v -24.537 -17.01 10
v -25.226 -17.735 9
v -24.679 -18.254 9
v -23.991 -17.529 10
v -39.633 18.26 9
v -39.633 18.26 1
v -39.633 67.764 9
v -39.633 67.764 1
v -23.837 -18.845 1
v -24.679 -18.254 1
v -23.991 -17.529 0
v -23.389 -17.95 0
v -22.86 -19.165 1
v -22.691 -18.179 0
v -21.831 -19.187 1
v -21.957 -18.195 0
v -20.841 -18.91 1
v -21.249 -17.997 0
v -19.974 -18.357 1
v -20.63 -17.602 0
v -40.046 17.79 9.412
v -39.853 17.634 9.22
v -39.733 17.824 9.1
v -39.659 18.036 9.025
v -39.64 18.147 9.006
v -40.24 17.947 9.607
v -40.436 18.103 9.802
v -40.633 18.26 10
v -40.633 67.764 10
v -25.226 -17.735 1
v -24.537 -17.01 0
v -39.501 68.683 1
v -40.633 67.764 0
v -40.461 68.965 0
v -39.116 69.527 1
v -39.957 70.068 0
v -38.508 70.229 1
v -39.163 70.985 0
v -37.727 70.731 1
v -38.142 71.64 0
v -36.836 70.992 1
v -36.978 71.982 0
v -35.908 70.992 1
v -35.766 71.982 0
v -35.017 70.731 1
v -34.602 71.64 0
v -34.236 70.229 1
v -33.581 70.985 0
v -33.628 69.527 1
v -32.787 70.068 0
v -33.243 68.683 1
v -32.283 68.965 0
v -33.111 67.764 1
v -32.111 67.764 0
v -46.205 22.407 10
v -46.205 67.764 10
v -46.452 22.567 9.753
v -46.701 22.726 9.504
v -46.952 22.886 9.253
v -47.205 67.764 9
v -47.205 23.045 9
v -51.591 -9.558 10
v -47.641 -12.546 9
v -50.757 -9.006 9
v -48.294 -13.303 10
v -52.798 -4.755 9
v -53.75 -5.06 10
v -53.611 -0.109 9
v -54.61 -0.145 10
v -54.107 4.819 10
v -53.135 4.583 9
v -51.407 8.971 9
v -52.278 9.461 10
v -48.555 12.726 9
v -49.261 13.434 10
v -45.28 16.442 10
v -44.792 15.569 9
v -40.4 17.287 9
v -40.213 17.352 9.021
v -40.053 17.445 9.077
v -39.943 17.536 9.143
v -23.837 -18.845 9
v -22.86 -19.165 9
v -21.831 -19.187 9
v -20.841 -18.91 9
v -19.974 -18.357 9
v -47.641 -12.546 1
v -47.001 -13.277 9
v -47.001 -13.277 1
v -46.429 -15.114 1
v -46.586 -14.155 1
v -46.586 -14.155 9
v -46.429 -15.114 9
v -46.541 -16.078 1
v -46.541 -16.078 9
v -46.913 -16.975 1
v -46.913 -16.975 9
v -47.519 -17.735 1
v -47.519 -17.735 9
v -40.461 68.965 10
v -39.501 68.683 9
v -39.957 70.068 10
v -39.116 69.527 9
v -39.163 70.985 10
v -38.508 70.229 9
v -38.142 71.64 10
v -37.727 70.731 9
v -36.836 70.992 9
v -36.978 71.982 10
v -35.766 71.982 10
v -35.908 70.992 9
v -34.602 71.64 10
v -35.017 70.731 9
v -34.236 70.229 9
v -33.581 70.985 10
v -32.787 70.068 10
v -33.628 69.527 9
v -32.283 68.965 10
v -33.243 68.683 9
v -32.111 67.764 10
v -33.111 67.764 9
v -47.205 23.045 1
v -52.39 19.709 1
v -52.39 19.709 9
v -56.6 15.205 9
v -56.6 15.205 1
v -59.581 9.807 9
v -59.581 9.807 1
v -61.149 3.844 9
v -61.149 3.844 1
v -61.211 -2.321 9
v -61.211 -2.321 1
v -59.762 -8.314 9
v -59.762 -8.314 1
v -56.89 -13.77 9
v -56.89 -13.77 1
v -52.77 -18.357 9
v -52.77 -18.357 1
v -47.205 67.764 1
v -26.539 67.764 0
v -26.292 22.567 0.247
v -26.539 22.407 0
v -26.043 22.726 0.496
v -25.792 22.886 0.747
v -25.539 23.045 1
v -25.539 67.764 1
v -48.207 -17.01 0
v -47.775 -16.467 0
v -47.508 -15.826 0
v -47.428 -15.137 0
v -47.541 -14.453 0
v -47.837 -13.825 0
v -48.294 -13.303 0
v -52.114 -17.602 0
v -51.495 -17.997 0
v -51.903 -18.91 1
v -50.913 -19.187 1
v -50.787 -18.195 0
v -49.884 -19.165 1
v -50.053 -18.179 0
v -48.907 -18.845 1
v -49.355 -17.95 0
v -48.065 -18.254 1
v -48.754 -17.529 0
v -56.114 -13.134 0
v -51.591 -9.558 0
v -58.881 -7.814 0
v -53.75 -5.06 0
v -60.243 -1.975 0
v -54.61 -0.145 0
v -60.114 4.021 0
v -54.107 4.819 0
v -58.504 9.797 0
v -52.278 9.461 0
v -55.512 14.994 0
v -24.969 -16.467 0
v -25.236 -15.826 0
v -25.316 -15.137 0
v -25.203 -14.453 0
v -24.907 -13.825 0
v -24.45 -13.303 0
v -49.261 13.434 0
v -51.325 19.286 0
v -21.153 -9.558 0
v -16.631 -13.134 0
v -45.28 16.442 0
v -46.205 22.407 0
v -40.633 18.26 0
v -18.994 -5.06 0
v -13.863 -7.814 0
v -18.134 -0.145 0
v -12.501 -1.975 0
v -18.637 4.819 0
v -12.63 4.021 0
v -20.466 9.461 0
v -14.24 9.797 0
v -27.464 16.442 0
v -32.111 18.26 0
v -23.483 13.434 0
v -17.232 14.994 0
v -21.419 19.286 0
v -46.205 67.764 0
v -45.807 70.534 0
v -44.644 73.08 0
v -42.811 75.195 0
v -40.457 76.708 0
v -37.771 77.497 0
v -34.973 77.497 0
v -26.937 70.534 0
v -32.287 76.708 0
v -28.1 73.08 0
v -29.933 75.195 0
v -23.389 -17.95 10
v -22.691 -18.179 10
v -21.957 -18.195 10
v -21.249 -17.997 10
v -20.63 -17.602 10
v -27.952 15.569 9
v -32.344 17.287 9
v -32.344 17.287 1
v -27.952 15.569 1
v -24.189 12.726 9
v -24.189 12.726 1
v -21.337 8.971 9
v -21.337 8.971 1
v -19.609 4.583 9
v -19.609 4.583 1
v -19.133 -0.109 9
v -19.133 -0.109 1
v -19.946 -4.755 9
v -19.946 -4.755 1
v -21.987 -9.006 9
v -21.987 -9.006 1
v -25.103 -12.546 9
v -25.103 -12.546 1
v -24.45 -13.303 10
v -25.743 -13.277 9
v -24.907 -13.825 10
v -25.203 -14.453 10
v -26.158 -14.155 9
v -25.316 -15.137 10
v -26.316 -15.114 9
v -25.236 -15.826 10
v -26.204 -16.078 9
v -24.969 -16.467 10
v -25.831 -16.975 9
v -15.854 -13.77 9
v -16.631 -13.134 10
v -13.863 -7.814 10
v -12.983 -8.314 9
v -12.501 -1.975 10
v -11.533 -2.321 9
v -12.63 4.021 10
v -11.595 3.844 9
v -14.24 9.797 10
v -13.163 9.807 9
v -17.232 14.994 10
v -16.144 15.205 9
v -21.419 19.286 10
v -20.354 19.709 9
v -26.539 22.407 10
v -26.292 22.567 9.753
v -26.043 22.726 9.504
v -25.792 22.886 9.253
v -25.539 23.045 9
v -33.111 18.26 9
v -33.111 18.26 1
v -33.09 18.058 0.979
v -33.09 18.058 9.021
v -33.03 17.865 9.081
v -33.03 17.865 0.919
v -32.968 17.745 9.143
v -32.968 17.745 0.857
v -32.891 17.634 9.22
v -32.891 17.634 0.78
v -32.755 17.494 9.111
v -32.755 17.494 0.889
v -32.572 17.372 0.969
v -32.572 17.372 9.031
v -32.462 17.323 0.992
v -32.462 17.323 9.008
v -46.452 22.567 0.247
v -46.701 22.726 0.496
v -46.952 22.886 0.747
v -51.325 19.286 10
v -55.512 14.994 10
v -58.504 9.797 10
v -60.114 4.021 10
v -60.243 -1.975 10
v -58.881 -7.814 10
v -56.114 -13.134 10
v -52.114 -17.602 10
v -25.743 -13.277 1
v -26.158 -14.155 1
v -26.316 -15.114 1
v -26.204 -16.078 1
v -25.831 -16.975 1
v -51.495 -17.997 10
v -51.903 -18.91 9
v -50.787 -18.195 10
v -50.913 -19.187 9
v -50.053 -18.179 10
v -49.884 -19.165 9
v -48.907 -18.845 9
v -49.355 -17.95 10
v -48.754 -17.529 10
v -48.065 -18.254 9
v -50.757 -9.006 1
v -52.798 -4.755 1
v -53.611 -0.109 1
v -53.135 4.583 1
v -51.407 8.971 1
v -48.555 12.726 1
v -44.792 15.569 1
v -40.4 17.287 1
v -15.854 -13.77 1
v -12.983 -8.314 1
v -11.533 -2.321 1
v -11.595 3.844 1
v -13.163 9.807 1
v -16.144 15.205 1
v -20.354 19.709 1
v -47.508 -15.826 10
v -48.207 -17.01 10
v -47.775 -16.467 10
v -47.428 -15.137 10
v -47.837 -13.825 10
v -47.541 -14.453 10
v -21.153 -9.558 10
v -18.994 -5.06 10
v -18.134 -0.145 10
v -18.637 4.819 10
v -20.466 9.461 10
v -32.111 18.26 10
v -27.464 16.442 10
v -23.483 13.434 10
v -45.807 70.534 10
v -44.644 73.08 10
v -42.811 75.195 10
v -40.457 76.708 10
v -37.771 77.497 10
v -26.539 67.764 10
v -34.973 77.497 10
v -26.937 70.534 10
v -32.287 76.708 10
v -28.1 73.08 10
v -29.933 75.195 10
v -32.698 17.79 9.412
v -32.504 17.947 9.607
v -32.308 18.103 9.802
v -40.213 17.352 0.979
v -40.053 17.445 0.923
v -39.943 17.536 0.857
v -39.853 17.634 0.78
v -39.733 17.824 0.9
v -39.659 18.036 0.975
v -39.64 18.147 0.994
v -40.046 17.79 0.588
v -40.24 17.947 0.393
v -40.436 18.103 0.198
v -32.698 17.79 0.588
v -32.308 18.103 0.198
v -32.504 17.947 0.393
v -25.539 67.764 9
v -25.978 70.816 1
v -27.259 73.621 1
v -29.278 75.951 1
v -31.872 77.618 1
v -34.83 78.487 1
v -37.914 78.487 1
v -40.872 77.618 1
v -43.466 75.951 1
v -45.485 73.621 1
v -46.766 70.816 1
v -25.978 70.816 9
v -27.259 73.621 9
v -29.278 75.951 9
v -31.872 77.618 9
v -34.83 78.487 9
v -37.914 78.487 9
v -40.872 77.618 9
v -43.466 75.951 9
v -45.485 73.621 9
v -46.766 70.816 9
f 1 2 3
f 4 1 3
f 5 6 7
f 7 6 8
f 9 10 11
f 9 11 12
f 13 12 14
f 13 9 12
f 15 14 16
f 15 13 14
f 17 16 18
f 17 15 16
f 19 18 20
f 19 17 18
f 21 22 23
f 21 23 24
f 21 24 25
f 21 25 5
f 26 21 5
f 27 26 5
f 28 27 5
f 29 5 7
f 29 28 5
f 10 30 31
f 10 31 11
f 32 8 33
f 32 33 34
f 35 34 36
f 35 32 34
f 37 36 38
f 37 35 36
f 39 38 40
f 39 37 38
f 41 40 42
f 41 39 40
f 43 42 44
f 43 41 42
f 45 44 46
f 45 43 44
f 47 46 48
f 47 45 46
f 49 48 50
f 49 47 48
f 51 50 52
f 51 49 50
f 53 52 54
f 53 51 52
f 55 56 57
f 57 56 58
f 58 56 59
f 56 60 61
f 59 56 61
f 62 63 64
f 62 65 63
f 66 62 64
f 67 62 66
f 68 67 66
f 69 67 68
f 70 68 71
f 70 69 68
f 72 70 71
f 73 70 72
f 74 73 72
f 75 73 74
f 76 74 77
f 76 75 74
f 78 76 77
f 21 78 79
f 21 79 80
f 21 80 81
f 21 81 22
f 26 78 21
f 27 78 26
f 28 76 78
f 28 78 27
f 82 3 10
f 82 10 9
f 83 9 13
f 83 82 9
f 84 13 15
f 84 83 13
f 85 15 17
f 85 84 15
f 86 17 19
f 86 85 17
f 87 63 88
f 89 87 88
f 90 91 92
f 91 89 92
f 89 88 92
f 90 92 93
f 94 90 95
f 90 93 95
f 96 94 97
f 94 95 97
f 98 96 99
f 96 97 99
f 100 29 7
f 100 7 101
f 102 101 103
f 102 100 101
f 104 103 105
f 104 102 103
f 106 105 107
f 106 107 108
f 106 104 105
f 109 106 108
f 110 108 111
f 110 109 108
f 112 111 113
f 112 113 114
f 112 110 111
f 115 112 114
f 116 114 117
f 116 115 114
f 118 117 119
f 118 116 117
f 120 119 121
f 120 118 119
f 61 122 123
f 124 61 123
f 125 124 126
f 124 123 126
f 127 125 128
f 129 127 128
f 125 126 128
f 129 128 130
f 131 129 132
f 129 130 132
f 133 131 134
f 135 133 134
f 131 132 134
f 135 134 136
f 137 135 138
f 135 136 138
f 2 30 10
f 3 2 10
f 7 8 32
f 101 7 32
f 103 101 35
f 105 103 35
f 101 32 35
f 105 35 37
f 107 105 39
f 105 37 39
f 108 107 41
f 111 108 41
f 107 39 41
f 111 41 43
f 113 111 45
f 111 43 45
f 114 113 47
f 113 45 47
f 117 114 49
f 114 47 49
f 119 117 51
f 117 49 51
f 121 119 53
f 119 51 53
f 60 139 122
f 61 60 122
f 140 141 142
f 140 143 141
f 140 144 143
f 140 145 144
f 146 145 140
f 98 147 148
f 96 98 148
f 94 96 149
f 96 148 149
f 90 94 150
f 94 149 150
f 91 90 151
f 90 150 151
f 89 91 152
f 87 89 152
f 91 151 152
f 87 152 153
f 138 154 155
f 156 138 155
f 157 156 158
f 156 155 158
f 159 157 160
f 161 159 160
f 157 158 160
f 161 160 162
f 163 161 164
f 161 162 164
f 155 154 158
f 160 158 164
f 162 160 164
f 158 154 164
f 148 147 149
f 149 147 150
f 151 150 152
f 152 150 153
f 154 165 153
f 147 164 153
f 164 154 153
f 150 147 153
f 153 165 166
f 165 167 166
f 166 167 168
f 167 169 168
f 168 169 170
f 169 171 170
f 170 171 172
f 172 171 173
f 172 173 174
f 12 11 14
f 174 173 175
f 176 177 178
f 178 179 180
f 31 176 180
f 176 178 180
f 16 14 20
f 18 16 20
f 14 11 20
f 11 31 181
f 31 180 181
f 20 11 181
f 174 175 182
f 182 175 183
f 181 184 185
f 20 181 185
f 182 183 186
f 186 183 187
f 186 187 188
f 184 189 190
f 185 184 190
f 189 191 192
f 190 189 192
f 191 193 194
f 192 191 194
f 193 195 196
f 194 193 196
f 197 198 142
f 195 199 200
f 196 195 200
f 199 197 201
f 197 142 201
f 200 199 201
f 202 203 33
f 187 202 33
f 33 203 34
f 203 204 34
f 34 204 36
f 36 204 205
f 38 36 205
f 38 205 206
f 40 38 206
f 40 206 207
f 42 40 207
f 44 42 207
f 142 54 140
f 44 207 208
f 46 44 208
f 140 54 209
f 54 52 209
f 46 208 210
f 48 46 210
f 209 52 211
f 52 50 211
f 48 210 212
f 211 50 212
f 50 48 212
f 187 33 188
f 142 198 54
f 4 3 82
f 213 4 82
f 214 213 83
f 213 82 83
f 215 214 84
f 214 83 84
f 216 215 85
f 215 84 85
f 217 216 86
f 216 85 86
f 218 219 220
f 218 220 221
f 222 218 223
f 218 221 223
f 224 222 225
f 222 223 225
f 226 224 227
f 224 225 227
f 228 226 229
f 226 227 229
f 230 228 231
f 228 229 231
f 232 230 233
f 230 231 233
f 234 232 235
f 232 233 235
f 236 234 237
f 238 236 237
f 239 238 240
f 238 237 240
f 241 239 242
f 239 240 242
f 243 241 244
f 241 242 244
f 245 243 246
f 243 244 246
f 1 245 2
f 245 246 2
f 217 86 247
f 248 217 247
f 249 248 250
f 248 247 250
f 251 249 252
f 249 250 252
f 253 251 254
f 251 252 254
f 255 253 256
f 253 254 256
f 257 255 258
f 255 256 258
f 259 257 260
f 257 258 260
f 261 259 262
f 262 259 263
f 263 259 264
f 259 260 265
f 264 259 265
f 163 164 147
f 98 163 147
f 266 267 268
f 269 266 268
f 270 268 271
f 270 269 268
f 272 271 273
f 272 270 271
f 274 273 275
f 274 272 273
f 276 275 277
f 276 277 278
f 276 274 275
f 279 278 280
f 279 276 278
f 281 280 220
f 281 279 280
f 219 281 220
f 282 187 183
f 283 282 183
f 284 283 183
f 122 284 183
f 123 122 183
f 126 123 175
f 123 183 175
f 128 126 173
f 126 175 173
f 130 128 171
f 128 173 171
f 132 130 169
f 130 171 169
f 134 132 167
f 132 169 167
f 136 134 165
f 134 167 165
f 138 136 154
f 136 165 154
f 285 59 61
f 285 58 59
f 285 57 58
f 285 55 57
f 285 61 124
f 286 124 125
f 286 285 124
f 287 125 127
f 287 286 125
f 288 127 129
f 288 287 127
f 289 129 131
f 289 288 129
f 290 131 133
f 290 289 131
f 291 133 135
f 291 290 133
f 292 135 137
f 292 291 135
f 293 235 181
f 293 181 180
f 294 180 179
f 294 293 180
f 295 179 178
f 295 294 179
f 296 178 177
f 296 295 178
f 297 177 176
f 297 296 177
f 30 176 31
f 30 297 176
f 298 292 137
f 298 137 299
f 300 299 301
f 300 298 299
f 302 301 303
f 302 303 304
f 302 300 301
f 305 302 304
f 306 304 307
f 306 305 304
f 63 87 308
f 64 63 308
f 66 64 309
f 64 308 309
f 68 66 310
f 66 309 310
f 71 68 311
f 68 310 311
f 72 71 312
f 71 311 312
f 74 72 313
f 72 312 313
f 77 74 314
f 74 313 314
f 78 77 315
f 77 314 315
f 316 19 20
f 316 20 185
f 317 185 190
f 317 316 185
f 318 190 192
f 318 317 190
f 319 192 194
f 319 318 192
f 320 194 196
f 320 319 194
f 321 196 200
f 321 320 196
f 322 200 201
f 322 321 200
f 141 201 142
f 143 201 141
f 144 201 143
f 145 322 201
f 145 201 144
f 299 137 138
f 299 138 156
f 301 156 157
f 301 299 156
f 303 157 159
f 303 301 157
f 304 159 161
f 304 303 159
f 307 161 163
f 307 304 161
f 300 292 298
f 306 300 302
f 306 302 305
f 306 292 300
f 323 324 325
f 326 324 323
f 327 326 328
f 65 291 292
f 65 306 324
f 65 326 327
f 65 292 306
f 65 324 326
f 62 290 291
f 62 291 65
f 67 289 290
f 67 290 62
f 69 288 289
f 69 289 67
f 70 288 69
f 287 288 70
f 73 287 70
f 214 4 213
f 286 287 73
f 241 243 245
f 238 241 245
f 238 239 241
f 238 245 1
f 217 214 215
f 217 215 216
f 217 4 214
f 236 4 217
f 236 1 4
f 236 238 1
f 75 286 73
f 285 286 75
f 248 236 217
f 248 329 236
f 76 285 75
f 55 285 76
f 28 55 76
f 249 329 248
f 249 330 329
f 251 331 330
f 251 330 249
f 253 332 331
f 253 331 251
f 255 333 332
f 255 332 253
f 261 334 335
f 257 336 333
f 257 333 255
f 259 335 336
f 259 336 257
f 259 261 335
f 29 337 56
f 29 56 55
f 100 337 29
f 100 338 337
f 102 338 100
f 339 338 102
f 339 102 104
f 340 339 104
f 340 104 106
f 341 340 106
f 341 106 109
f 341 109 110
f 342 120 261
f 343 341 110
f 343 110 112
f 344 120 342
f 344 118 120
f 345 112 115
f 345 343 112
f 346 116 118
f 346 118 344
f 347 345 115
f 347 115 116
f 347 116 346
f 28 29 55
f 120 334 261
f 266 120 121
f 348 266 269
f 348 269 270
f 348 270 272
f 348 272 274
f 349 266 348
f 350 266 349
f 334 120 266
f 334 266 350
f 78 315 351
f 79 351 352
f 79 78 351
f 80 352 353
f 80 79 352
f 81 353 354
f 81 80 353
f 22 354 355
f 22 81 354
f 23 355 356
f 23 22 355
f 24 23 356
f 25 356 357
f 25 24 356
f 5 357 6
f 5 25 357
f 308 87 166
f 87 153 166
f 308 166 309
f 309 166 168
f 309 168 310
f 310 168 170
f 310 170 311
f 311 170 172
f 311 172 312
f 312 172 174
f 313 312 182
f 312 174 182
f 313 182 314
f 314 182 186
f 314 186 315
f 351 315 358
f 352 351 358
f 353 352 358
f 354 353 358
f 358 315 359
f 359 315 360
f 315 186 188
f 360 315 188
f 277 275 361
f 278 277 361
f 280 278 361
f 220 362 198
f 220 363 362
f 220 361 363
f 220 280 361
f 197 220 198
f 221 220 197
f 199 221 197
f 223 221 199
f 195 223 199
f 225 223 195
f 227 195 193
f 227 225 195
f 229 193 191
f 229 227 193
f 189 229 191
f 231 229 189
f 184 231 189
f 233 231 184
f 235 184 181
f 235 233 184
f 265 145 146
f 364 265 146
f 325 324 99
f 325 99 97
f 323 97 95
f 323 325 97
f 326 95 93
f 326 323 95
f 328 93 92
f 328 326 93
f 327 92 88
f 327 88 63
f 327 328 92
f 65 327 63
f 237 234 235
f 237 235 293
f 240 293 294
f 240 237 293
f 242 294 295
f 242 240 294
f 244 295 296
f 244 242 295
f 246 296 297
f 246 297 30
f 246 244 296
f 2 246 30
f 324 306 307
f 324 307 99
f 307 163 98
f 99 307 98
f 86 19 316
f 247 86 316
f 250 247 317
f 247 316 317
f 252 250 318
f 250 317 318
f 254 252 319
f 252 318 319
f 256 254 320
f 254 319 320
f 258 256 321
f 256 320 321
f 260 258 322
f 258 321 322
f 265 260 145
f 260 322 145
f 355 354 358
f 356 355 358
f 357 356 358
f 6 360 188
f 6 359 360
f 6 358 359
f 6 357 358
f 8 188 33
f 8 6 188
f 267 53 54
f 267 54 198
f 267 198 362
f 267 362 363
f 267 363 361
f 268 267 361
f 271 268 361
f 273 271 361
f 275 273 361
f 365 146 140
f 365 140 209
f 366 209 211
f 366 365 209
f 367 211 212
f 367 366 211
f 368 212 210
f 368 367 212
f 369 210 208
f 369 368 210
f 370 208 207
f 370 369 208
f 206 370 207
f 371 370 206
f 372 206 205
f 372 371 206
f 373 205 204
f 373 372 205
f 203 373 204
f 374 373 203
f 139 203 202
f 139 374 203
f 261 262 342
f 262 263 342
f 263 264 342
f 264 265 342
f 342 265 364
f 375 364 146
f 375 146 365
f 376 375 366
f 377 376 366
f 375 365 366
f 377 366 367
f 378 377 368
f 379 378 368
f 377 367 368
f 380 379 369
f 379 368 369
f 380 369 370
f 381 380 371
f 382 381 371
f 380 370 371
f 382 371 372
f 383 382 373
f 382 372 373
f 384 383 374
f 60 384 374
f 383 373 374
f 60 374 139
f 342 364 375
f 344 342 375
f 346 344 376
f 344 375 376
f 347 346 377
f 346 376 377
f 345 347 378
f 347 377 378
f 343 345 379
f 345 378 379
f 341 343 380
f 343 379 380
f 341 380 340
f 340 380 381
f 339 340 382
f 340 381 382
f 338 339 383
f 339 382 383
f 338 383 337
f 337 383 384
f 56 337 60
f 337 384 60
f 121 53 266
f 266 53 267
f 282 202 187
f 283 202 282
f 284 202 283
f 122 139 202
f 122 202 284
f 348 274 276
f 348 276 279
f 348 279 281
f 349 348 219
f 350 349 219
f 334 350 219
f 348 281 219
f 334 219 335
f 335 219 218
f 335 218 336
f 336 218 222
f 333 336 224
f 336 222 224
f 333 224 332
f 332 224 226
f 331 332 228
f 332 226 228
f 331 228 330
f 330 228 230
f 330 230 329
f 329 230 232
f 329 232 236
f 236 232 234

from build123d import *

# Parameters (mm, degrees)
F1_DEPTH = 10
F2_R     = 3.5
F3_SIZE  = 1
F4_R     = 1


# Not quite as in the source:
# - a feature names something its author has since deleted; it is built from what else it names


with BuildPart() as f1:
    # F0 (on Top) → F1 (new body)
    with BuildSketch(Plane.XY):
        with BuildLine():
            ThreePointArc((-44.3848475016, -14.7620242305), (-53.4374201274, 3.0310367894), (-39.6333784075, 17.4529133594))
            Line((-39.6333784075, 17.4529133594), (-39.6333784075, 67.7640176489))
            ThreePointArc((-39.6333784075, 67.7640176489), (-36.3720424684, 71.025353588), (-33.1107065292, 67.7640176489))
            Line((-33.1107065292, 67.7640176489), (-33.1107065292, 17.4529133594))
            ThreePointArc((-33.1107065292, 17.4529133594), (-19.3066648093, 3.0310367894), (-28.3592374351, -14.7620242305))
            Line((-28.3592374351, -14.7620242305), (-22.5229276093, -20.2994880054))
            ThreePointArc((-22.5229276093, -20.2994880054), (-11.4323530197, 2.249497469), (-25.5391483675, 23.0450718941))
            Line((-25.5391483675, 23.0450718941), (-25.5391483675, 67.7640176489))
            ThreePointArc((-25.5391483675, 67.7640176489), (-36.3720424684, 78.5969117497), (-47.2049365692, 67.7640176489))
            Line((-47.2049365692, 67.7640176489), (-47.2049365692, 23.0450718941))
            ThreePointArc((-47.2049365692, 23.0450718941), (-61.311731917, 2.249497469), (-50.2211573274, -20.2994880054))
            Line((-50.2211573274, -20.2994880054), (-44.3848475016, -14.7620242305))
        make_face()
    extrude(amount=F1_DEPTH)

    # F2
    f2_edges = [f1.edges().sort_by_distance(p)[0] for p in [
        (-50.221157, -20.299488, 5),
        (-44.384848, -14.762024, 5),
        (-28.359237, -14.762024, 5),
        (-22.522928, -20.299488, 5),
    ]]
    fillet(f2_edges, radius=F2_R)

    # F3
    f3_edges = [f1.edges().sort_by_distance(p)[0] for p in [
        (-53.038502, 4.962794, 10),
        (-61.149218, 3.844419, 10),
        (-47.204937, 45.404545, 10),
        (-39.633378, 42.608466, 10),
        (-36.372042, 78.596912, 10),
        (-36.372042, 71.025354, 10),
        (-33.110707, 42.608466, 10),
        (-25.539148, 45.404545, 10),
        (-19.705582, 4.962794, 10),
        (-11.594867, 3.844419, 0),
        (-25.539148, 45.404545, 0),
        (-39.633378, 42.608466, 0),
        (-53.038502, 4.962794, 0),
    ]]
    chamfer(f3_edges, length=F3_SIZE)

    # F4
    f4_edges = [f1.edges().sort_by_distance(p)[0] for p in [
        (-39.633378, 17.452913, 5),
        (-33.110707, 17.452913, 5),
    ]]
    fillet(f4_edges, radius=F4_R)


solid = f1.part
